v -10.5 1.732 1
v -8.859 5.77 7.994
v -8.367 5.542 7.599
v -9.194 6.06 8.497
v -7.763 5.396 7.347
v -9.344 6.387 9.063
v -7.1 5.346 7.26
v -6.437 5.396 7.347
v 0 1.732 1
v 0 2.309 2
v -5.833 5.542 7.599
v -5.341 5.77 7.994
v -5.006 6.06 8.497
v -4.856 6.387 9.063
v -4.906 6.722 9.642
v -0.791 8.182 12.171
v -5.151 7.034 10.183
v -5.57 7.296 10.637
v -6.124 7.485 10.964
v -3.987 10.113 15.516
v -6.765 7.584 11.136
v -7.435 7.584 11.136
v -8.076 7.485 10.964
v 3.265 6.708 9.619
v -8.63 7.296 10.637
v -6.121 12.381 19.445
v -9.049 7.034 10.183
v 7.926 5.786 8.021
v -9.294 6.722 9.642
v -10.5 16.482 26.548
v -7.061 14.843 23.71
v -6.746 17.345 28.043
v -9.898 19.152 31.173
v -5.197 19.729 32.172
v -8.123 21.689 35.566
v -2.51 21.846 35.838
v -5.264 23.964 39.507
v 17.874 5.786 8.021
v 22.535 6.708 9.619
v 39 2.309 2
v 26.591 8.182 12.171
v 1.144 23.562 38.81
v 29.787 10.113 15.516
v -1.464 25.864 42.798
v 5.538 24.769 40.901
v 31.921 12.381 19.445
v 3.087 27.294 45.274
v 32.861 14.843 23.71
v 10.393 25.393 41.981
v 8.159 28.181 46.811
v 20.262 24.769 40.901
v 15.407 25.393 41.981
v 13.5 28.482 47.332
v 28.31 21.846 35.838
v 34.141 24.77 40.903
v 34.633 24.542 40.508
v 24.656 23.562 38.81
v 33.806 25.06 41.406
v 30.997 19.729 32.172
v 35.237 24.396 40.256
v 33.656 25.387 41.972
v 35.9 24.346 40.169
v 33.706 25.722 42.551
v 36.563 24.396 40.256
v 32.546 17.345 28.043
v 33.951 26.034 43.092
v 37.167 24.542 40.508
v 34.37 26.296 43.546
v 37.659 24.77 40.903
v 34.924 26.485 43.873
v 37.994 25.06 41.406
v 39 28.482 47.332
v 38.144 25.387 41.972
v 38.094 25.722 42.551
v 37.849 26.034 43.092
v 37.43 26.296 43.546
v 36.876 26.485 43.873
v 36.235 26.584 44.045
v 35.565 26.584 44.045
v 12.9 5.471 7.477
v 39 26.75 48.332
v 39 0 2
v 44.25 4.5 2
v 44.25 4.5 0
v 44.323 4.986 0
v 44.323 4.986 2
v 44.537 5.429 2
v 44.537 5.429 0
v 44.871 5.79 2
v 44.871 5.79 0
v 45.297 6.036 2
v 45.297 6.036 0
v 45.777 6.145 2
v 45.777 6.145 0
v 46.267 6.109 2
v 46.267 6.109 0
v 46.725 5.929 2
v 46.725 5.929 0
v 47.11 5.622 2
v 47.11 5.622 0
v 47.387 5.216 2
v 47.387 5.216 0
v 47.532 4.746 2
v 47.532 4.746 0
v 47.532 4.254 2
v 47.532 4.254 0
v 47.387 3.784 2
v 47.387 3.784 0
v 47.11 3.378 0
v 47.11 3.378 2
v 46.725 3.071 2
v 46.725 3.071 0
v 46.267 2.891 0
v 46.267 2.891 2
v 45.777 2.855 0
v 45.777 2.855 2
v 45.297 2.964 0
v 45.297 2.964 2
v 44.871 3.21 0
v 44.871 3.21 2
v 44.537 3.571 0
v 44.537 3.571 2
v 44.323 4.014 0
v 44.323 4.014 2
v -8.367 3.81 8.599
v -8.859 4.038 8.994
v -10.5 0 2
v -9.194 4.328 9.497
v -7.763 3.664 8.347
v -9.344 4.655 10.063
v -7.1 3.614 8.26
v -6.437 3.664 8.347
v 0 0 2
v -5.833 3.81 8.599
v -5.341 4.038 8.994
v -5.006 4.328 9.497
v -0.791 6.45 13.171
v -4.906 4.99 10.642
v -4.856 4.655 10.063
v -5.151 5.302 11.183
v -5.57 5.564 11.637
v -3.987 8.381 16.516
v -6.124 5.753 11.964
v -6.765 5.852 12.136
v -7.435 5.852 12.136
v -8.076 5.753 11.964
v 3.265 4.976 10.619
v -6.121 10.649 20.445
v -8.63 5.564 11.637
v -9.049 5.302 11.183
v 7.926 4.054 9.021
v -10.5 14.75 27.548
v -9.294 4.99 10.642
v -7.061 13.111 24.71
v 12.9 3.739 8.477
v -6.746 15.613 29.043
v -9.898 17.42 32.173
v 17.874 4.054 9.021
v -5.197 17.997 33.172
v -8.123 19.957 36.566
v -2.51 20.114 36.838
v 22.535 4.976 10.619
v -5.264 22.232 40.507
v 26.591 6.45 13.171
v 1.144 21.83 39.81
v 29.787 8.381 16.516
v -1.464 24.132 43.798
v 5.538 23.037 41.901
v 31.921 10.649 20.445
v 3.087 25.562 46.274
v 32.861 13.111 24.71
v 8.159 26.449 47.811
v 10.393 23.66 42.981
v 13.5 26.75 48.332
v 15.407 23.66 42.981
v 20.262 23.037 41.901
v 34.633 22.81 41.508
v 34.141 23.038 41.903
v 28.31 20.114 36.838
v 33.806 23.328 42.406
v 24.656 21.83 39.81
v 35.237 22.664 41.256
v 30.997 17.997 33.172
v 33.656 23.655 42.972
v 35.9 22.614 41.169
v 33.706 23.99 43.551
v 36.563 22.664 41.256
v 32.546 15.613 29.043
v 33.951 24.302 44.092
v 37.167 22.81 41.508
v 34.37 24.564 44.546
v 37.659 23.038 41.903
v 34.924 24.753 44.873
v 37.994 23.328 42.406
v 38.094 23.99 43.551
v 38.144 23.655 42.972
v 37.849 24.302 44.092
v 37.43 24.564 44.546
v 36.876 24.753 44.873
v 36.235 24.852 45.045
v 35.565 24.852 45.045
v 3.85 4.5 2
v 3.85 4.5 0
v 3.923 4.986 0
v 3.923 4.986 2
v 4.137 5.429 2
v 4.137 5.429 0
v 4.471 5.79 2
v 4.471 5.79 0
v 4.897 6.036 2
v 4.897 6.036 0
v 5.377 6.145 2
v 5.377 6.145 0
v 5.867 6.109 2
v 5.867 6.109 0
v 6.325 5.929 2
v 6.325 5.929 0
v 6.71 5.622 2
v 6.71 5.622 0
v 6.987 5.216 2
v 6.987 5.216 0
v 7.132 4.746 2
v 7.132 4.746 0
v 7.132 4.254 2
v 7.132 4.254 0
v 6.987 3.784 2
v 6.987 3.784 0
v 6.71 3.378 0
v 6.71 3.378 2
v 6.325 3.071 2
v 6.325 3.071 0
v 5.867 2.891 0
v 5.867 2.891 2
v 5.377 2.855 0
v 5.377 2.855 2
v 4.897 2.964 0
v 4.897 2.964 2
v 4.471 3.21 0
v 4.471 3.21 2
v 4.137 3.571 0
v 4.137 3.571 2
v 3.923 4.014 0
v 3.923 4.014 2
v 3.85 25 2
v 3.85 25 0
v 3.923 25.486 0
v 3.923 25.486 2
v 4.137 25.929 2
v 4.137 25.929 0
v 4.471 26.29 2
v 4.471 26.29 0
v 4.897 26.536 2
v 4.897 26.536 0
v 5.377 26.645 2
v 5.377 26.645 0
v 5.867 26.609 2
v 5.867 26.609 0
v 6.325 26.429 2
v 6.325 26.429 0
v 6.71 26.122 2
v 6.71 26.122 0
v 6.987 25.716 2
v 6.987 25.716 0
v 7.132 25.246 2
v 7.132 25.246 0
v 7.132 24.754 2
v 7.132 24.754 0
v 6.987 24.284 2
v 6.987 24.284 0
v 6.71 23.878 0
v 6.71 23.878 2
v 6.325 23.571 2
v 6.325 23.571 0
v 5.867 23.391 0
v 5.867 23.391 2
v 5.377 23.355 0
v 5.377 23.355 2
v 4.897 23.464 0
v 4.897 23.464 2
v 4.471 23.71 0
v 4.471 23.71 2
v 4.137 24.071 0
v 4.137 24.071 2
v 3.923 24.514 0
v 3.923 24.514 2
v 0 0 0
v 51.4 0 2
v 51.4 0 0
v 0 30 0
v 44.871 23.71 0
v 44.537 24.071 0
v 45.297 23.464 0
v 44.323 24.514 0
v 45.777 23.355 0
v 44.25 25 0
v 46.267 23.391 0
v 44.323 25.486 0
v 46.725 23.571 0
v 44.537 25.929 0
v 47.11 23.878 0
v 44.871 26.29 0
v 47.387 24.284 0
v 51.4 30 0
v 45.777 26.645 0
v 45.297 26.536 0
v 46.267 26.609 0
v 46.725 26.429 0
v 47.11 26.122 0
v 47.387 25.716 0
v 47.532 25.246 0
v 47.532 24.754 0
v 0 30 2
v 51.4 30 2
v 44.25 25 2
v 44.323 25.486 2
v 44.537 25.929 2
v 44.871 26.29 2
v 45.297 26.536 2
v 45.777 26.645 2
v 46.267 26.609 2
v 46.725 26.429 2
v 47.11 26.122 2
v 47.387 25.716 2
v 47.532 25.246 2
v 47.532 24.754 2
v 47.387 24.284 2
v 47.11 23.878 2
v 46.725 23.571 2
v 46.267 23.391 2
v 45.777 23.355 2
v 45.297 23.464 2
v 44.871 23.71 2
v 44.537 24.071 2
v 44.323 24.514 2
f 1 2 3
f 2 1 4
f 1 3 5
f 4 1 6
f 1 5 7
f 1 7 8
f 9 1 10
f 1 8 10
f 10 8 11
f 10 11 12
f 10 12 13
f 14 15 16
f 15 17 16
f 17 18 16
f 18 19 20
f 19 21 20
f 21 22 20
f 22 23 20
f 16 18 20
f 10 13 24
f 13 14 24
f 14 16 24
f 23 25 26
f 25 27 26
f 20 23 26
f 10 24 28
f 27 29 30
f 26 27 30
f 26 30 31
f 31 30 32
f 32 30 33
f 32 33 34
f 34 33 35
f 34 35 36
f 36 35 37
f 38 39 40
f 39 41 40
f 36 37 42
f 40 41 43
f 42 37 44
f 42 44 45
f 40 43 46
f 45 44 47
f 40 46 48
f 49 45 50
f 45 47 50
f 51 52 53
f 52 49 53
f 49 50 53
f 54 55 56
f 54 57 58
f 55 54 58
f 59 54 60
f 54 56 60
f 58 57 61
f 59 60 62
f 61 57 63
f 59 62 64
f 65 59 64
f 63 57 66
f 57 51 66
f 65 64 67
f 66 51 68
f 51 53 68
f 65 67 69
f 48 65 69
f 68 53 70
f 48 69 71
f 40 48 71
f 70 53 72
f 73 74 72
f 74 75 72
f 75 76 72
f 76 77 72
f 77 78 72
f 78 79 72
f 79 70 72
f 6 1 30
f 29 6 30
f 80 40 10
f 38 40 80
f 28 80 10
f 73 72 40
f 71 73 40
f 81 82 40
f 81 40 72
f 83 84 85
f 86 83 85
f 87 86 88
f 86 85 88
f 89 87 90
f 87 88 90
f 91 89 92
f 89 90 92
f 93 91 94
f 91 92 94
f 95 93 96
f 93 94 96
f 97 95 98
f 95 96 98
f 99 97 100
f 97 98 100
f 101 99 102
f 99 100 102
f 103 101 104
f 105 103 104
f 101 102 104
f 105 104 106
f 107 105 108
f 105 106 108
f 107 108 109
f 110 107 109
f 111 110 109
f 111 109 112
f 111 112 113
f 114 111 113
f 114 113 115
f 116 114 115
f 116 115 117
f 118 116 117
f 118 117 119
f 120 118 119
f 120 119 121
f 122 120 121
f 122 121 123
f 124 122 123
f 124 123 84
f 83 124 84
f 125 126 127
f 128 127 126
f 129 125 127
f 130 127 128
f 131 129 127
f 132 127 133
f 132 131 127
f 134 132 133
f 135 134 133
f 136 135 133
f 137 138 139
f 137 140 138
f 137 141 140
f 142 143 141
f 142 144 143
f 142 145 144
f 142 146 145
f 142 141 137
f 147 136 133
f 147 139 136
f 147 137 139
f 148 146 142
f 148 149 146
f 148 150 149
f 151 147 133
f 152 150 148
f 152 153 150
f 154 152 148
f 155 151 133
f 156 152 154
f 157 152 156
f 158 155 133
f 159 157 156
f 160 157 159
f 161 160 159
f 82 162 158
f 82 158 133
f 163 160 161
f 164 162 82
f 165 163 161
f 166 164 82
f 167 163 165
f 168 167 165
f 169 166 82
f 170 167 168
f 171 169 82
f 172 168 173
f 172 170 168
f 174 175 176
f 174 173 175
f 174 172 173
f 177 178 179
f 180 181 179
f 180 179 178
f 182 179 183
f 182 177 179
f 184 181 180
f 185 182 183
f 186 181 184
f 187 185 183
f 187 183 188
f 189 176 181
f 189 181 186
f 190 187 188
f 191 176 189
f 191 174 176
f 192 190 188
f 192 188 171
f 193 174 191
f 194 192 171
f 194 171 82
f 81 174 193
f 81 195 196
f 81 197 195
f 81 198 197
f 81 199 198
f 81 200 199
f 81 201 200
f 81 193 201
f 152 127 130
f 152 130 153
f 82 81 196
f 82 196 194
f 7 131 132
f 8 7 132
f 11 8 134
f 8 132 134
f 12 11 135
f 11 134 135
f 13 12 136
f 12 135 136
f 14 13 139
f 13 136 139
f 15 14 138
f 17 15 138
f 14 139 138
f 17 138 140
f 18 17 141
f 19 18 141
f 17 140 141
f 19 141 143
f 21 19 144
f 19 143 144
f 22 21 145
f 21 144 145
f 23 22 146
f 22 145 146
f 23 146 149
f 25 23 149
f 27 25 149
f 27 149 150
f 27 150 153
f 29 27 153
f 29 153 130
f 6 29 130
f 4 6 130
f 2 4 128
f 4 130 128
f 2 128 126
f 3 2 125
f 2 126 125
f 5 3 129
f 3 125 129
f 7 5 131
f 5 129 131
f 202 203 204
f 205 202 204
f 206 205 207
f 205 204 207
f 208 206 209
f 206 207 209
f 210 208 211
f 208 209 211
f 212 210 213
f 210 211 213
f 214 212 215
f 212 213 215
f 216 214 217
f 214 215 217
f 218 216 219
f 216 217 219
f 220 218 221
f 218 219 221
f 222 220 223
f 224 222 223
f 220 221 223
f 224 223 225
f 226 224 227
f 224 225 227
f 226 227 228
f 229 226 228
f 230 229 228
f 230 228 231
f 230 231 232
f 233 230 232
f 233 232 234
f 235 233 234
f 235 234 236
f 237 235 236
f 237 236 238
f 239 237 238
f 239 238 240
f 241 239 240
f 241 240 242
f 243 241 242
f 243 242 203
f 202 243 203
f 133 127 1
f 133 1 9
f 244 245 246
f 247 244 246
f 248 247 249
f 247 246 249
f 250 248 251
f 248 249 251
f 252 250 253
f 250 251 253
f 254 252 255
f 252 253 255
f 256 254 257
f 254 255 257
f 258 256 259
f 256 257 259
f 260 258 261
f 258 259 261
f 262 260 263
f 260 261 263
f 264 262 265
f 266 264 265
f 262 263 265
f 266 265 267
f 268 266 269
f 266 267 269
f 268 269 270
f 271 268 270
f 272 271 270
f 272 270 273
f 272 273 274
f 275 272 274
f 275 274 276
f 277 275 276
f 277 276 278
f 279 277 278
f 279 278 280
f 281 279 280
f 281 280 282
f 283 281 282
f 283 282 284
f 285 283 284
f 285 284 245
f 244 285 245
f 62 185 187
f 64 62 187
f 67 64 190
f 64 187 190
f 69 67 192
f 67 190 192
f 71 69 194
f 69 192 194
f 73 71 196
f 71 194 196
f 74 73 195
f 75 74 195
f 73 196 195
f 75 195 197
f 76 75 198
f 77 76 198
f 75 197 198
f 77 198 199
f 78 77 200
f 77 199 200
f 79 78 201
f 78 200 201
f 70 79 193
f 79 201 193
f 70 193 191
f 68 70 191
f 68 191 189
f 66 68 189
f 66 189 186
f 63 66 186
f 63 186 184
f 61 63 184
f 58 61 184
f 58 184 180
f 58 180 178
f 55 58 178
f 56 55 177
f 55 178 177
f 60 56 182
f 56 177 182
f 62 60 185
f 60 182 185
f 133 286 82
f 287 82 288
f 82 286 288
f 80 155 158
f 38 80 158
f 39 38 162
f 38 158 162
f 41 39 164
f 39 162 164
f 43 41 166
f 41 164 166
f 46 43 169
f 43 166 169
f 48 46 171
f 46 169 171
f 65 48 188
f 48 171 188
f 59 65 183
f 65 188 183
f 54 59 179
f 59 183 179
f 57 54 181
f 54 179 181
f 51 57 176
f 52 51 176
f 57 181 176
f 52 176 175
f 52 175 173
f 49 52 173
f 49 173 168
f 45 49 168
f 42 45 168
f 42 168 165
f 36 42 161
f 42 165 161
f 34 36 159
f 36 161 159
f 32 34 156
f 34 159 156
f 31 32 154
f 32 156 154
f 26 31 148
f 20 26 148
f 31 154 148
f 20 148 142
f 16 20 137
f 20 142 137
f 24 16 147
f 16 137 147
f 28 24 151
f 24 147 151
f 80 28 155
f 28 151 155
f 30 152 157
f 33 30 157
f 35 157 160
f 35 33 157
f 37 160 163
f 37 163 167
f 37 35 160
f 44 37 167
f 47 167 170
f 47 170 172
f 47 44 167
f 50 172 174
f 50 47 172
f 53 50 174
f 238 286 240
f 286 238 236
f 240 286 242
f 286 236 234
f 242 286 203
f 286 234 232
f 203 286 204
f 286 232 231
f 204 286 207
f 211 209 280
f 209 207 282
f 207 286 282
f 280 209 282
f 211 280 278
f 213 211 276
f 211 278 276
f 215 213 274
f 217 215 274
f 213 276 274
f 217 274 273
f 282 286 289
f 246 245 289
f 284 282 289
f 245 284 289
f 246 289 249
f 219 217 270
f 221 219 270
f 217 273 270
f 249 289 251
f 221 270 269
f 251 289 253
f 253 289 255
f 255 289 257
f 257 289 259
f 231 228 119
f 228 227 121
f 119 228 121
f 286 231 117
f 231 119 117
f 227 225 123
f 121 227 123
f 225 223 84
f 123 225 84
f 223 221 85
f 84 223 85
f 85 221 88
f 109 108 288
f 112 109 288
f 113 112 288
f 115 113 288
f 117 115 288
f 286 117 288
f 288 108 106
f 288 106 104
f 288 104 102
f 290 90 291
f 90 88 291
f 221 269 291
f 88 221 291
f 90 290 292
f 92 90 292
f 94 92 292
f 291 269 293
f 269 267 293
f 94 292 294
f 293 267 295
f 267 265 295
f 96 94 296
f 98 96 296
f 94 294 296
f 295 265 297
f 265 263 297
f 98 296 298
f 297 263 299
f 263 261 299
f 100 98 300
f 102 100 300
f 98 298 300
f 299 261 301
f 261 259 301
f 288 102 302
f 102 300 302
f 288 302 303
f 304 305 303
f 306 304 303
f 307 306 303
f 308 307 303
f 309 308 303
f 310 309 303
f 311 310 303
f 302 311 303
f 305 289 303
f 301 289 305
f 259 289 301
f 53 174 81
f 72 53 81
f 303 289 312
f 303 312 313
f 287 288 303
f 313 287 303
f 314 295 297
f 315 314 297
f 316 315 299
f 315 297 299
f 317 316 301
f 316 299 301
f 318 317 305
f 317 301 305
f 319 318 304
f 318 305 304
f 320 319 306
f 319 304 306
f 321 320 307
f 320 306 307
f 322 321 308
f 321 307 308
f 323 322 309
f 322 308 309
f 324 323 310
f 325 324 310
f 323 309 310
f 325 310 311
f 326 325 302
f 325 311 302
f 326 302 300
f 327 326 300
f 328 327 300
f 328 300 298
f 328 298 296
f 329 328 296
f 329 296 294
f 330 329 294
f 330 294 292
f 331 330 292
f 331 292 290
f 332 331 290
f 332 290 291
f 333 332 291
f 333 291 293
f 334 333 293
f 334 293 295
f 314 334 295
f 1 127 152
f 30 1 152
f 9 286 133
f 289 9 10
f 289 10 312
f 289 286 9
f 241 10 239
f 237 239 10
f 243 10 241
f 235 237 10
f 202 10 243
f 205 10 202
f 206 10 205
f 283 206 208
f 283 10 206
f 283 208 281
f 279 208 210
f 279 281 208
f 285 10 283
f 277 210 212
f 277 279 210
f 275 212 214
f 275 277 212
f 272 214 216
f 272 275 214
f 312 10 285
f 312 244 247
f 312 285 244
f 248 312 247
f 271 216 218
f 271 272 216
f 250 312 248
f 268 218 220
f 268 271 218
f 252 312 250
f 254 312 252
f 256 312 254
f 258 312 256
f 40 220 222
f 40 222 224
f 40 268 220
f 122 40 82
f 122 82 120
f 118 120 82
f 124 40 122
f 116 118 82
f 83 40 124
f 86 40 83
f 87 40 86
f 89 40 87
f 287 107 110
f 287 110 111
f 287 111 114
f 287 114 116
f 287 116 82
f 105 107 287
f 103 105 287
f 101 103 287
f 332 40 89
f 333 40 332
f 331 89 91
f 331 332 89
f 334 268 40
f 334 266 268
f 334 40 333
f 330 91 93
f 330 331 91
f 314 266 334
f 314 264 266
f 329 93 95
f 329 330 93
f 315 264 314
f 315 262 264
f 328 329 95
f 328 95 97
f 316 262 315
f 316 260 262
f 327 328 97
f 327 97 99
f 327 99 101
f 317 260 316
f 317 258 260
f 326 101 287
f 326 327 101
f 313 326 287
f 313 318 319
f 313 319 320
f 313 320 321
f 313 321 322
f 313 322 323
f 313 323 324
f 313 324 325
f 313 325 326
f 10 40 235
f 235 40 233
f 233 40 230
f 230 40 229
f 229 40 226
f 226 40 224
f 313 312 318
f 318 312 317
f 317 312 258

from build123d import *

# Parameters (mm, degrees)
SKETCH1_W           = 51.4
SKETCH1_H           = 30
BOSS_EXTRUDE1_DEPTH = 2
SKETCH2_R           = 1.65
CUT_EXTRUDE1_DEPTH  = 10
SKETCH3_W           = 49.5
SKETCH3_H           = 53.5
BOSS_EXTRUDE2_DEPTH = 2
FILLET1_R           = 24
SKETCH5_R           = 2.25
CUT_EXTRUDE2_DEPTH  = 2
SKETCH6_R           = 20
CUT_EXTRUDE3_DEPTH  = 2


with BuildPart() as part:
    # Sketch1 → Boss-Extrude1 (new body)
    with BuildSketch(Plane.XY):
        with Locations((25.7, 15)):
            Rectangle(SKETCH1_W, SKETCH1_H)
    extrude(amount=BOSS_EXTRUDE1_DEPTH)

    # Sketch2 → Cut-Extrude1 (cut)
    with BuildSketch(Plane(origin=(0, 0, 0), x_dir=(-1, 0, 0), z_dir=(0, 0, -1))):
        with Locations((-45.9, 25)):
            Circle(SKETCH2_R)
        with Locations((-5.5, 25)):
            Circle(SKETCH2_R)
        with Locations((-5.5, 4.5)):
            Circle(SKETCH2_R)
        with Locations((-45.9, 4.5)):
            Circle(SKETCH2_R)
    extrude(amount=-CUT_EXTRUDE1_DEPTH, mode=Mode.SUBTRACT)

    # Sketch3 → Boss-Extrude2 (add)
    with BuildSketch(Plane(origin=(0, -0.8660254037844364, 0.4999999999999961), x_dir=(1, 0, 0), z_dir=(0, -0.8660254037844398, 0.499999999999998))):
        with Locations((14.25, 28.482050808)):
            Rectangle(SKETCH3_W, SKETCH3_H)
    extrude(amount=-BOSS_EXTRUDE2_DEPTH)

    # Fillet1
    fillet1_edges = [part.edges().sort_by_distance(p)[0] for p in [
        (-10.5, 27.616025404, 47.832359102),
    ]]
    fillet(fillet1_edges, radius=FILLET1_R)

    # Sketch5 → Cut-Extrude2 (cut)
    with BuildSketch(Plane(origin=(0, -0.8660254037844378, 0.4999999999999969), x_dir=(1, 0, 0), z_dir=(0, -0.8660254037844399, 0.49999999999999806))):
        with Locations(Location((35.9, 49.210750739, 0), (0, 0, 270))):
            Circle(SKETCH5_R)
        with Locations(Location((-7.1, 11.210750739, 0), (0, 0, 270))):
            Circle(SKETCH5_R)
    extrude(amount=-CUT_EXTRUDE2_DEPTH, mode=Mode.SUBTRACT)

    # Sketch6 → Cut-Extrude3 (cut)
    with BuildSketch(Plane(origin=(0, -0.8660254037844378, 0.4999999999999969), x_dir=(1, 0, 0), z_dir=(0, -0.8660254037844399, 0.49999999999999806))):
        with Locations(Location((12.9, 29.210750739, 0), (0, 0, 270))):
            Circle(SKETCH6_R)
    extrude(amount=-CUT_EXTRUDE3_DEPTH, mode=Mode.SUBTRACT)


solid = part.part
